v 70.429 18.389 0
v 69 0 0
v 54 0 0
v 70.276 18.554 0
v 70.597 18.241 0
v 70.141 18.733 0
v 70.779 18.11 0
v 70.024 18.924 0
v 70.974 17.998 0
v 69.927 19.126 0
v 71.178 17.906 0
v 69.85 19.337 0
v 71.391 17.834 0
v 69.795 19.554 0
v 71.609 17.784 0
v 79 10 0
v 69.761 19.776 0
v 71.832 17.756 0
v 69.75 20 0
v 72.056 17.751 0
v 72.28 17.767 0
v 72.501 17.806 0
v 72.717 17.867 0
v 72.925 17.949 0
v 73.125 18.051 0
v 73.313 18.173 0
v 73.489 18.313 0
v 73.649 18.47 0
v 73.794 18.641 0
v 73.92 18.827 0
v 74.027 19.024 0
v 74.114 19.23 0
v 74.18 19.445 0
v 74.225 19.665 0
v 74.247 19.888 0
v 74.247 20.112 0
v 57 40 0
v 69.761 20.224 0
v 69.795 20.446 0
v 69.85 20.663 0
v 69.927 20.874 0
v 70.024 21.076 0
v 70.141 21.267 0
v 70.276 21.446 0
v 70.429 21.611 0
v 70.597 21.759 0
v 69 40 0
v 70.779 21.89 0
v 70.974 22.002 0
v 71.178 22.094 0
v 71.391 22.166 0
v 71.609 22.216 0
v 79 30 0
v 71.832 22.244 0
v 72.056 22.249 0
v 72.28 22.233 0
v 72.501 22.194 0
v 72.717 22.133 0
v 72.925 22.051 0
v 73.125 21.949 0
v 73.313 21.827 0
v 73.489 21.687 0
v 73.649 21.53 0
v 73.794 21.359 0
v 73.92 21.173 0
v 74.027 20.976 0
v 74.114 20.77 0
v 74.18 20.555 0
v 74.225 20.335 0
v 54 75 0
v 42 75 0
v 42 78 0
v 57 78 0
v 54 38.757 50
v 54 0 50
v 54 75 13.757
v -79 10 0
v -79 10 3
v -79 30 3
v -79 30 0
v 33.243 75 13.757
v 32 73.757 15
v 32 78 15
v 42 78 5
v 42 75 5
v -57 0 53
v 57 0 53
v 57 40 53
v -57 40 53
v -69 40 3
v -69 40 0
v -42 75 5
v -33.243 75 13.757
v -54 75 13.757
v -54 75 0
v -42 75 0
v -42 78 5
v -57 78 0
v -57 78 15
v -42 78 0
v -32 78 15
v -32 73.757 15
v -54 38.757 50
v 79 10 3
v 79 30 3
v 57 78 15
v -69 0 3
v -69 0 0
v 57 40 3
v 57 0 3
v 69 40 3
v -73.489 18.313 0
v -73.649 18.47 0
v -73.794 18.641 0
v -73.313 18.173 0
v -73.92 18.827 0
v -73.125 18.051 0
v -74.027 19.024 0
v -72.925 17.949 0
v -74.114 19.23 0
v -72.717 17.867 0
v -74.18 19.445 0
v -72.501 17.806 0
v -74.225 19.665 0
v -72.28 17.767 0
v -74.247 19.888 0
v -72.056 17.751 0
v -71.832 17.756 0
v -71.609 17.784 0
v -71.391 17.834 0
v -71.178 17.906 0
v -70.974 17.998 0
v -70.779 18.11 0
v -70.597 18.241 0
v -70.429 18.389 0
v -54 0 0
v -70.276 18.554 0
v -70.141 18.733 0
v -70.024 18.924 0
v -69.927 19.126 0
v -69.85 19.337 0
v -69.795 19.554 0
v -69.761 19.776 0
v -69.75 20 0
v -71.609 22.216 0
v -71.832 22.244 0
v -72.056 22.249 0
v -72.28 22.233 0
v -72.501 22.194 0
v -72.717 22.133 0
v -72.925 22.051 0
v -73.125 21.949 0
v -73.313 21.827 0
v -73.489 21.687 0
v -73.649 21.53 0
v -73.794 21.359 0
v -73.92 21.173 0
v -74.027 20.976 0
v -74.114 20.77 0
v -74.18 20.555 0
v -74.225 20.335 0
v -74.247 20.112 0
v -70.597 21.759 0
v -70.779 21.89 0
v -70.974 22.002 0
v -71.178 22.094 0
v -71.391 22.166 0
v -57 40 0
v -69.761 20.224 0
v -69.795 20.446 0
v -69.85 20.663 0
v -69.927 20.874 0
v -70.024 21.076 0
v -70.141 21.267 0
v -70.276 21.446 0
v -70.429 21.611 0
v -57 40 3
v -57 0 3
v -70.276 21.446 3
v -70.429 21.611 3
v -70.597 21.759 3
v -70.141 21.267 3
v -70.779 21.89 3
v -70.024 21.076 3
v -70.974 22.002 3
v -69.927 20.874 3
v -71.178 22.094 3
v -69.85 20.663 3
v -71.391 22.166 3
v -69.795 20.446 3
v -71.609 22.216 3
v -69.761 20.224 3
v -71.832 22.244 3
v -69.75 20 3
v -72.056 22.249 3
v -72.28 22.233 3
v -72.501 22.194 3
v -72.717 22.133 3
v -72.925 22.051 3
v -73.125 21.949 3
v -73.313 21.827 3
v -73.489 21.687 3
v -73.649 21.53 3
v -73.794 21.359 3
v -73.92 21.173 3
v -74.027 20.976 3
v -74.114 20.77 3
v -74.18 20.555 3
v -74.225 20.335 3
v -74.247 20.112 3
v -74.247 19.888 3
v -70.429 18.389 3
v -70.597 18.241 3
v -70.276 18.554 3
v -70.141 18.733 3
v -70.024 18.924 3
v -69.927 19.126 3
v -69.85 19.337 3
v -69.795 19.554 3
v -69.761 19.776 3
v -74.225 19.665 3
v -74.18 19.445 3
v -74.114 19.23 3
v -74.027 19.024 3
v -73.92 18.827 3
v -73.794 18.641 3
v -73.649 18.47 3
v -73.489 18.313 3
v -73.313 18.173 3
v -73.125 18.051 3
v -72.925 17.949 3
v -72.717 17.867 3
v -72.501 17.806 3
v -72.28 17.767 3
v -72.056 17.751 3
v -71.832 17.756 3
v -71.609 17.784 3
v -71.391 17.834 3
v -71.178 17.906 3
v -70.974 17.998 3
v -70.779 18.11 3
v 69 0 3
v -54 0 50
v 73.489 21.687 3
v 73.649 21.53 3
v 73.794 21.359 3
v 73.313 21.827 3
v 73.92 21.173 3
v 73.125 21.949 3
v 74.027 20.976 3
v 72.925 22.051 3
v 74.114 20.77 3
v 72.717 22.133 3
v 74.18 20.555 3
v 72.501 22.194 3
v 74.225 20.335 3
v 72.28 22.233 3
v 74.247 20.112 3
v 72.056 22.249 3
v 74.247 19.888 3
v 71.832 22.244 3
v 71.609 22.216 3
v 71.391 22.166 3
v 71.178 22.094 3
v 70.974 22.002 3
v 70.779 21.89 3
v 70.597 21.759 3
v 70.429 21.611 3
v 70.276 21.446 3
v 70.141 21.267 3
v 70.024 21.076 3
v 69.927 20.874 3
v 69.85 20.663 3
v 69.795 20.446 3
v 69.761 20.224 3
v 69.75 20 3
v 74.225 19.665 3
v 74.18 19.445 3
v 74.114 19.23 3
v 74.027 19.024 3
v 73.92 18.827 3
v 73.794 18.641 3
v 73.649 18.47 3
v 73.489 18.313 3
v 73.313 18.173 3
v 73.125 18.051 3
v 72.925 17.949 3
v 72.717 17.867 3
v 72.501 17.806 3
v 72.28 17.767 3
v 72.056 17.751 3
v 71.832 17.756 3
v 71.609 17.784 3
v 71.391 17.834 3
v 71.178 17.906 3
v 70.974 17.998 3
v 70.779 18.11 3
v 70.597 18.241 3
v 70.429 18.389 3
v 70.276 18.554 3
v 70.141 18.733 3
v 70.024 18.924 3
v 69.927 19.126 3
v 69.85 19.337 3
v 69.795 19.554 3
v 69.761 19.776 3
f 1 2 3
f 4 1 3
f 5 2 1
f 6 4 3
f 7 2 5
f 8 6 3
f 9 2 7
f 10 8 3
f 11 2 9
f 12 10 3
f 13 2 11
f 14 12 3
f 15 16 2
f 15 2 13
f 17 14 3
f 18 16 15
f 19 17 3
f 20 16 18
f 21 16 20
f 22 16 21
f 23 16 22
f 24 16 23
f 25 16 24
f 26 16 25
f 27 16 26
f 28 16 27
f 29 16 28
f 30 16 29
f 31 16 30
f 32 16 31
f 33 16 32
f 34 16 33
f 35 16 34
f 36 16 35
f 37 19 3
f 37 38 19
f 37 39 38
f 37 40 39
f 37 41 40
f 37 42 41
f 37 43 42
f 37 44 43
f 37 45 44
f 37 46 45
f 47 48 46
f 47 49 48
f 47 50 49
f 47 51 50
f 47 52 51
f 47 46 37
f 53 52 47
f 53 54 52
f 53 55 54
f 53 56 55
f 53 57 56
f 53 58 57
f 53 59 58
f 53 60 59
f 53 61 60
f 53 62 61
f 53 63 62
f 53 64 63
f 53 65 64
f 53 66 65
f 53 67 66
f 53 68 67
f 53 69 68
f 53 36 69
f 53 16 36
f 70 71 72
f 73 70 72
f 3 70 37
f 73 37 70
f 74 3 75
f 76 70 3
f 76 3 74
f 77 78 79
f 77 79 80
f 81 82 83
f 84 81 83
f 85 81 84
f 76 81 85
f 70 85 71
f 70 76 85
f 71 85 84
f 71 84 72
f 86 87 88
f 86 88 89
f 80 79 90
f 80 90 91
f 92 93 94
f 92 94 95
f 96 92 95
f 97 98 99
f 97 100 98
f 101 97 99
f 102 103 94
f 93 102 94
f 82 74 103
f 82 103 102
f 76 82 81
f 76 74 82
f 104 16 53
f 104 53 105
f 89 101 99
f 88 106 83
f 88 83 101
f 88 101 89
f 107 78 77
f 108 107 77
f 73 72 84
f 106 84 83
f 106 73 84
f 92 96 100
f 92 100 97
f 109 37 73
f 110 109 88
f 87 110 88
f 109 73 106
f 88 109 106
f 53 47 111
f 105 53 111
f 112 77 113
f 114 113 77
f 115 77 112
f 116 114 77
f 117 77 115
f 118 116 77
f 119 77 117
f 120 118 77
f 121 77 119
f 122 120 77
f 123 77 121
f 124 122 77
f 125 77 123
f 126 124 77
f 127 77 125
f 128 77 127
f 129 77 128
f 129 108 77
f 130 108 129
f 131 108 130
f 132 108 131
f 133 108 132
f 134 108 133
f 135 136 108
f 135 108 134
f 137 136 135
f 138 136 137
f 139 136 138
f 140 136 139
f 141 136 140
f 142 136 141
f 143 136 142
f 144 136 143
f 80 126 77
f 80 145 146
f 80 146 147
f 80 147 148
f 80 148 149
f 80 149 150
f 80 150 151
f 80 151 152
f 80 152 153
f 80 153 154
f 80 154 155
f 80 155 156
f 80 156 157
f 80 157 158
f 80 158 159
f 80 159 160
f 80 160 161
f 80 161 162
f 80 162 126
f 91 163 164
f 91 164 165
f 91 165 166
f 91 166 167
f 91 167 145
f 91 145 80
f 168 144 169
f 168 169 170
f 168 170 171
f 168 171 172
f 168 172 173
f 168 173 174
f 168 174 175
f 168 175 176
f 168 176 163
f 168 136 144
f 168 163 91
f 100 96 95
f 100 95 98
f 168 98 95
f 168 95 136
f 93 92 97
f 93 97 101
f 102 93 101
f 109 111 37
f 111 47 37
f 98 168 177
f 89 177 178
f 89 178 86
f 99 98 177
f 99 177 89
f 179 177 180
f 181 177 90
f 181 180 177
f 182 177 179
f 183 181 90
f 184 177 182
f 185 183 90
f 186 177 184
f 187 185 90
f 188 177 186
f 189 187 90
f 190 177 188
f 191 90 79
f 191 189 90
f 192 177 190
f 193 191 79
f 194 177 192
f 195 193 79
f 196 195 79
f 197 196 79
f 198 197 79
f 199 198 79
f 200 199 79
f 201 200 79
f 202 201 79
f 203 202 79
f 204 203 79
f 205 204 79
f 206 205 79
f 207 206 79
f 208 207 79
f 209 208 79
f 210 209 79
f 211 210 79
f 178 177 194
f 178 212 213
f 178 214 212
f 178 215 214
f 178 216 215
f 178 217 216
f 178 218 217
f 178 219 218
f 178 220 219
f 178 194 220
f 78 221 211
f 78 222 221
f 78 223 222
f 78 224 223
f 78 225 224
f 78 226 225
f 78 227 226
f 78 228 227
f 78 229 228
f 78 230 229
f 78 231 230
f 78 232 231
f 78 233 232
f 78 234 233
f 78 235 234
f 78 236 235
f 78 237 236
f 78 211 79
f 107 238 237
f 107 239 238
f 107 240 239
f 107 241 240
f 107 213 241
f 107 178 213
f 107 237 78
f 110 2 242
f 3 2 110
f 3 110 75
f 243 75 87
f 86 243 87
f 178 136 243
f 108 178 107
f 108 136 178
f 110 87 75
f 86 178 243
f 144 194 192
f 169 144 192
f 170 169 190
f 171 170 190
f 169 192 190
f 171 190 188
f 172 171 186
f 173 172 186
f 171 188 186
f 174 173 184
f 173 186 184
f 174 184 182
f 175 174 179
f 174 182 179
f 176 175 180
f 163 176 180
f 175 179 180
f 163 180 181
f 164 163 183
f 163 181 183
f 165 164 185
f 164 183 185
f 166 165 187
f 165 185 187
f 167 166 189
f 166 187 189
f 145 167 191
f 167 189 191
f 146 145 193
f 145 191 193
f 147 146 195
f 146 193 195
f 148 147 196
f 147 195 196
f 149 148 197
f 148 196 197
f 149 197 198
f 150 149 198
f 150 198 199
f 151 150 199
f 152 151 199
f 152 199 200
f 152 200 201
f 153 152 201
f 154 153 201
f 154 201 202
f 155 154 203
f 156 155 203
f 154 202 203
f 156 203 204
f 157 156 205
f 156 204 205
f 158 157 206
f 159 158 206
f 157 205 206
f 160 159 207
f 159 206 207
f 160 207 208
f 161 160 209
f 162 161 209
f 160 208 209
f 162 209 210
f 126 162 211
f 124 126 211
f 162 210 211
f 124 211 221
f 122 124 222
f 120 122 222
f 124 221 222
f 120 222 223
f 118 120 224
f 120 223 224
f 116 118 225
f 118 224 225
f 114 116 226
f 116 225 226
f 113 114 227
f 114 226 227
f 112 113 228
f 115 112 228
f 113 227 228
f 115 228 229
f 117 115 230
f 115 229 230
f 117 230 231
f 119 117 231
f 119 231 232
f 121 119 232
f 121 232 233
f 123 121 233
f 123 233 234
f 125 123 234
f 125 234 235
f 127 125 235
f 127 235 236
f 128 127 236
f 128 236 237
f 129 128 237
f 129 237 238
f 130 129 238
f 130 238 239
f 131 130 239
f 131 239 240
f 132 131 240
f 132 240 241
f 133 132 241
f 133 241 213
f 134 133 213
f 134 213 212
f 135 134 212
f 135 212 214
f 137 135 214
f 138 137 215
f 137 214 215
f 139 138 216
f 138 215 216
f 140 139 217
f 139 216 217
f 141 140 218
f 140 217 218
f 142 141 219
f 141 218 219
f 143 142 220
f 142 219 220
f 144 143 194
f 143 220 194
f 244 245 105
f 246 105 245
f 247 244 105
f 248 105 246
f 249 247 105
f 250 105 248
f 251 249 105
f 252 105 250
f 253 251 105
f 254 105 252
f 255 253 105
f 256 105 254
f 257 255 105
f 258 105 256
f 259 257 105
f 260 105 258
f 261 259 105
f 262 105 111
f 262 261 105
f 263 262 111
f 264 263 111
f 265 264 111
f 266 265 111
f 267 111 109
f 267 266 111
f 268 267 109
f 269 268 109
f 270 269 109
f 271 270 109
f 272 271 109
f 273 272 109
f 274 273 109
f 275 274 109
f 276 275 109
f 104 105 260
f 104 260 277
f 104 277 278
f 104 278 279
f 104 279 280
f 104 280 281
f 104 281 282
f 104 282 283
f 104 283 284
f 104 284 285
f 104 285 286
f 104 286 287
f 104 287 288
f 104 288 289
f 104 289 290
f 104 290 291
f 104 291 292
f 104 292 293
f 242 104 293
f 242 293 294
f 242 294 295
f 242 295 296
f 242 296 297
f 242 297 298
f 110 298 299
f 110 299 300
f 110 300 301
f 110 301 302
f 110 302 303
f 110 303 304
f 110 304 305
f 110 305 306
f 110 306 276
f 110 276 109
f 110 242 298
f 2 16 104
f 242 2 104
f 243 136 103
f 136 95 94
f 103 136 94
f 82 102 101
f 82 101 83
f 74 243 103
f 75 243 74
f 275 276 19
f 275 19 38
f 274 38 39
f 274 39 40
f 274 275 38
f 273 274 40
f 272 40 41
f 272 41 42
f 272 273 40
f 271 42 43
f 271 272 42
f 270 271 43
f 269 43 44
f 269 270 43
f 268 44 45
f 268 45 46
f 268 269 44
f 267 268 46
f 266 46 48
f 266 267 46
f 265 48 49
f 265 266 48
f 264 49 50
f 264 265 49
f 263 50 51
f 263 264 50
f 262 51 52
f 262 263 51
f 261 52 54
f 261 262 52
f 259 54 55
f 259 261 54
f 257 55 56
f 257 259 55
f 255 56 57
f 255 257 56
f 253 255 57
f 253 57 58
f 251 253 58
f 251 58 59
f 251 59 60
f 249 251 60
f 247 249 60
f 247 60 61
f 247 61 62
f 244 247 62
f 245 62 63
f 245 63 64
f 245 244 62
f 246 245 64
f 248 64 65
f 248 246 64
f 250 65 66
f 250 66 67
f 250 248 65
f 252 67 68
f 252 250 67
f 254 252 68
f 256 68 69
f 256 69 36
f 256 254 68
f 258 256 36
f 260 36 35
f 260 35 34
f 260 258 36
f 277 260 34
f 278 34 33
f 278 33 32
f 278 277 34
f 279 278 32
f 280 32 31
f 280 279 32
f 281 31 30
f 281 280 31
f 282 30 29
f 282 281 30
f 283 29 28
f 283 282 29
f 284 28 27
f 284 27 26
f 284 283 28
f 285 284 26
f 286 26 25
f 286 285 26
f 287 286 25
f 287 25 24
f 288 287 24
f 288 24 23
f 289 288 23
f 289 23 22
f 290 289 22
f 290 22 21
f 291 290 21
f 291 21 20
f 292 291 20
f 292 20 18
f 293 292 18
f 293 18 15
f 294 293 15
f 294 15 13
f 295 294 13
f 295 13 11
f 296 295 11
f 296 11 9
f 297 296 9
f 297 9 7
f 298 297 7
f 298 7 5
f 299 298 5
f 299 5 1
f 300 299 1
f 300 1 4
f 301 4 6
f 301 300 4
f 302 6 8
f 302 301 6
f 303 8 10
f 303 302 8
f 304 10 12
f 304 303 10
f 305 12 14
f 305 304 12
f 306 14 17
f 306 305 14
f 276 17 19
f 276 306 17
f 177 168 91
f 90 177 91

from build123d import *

# Parameters (mm, degrees)
BOSS_EXTRUDE1_DEPTH     = 40
BOSS_EXTRUDE2_DEPTH     = 3
EXTRUDE_THIN1_DEPTH     = 108
CUT_EXTRUDE1_DEPTH      = 124.020323524
CUT_EXTRUDE1_DEPTH_BACK = 12
CHAMFER1_SIZE           = 10
SKETCH5_R               = 2.25
CUT_EXTRUDE2_DEPTH      = 3


with BuildPart() as part:
    # Sketch1 → Boss-Extrude1 (new body)
    with BuildSketch(Plane(origin=(0, 0, 0), x_dir=(1, 0, 0), z_dir=(0, 1, 0))):
        Polygon((-54, 0), (-54, -50), (54, -50), (54, 0), (57, 0), (79, 0), (79, -3), (57, -3), (57, -53), (-57, -53), (-57, -3), (-79, -3), (-79, 0), (-57, 0), align=None)
    extrude(amount=BOSS_EXTRUDE1_DEPTH)

    # Sketch2 → Boss-Extrude2 (add)
    with BuildSketch(Plane.ZY.offset(57)):
        Polygon((53, 40), (15, 78), (0, 78), (0, 40), align=None)
    boss_extrude2 = extrude(amount=-BOSS_EXTRUDE2_DEPTH)

    # Mirror1: Boss-Extrude2 across plane
    add(boss_extrude2.mirror(Plane(origin=(0, 0, 0), x_dir=(0, 0, 1), z_dir=(1, 0, 0))))

    # Sketch3 → Extrude-Thin1 (add)
    with BuildSketch(Plane.ZY.offset(-54)):
        Polygon((0, 78), (15, 78), (53, 40), (50.878679656, 37.878679656), (13.757359313, 75), (0, 75), align=None)
    extrude(amount=EXTRUDE_THIN1_DEPTH)

    # Sketch4 → Cut-Extrude1 (cut, two sides: drawn at the far end of the back side and taken through both)
    with BuildSketch(Plane(origin=(0, 78, 0), x_dir=(1, 0, 0), z_dir=(0, 1, 0)).offset(-CUT_EXTRUDE1_DEPTH_BACK)):
        Polygon((-42, 274.196896272), (-42, 0), (-42, -5), (-32, -15), (32, -15), (42, -5), (42, 0), (42, 274.196896272), (42, 822.590688817), (-42, 822.590688817), align=None)
    extrude(amount=CUT_EXTRUDE1_DEPTH + CUT_EXTRUDE1_DEPTH_BACK, mode=Mode.SUBTRACT)

    # Chamfer1
    chamfer1_edges = [part.edges().sort_by_distance(p)[0] for p in [
        (-79, 40, 1.5),
        (79, 0, 1.5),
        (-79, 0, 1.5),
        (79, 40, 1.5),
    ]]
    chamfer(chamfer1_edges, length=CHAMFER1_SIZE)

    # Sketch5 → Cut-Extrude2 (cut)
    with BuildSketch(Plane.XY.offset(3)):
        with Locations((-72, 20)):
            Circle(SKETCH5_R)
    cut_extrude2 = extrude(amount=-CUT_EXTRUDE2_DEPTH, mode=Mode.SUBTRACT)

    # Mirror2: Cut-Extrude2 across plane
    add(cut_extrude2.mirror(Plane(origin=(0, 0, 0), x_dir=(0, 0, 1), z_dir=(1, 0, 0))), mode=Mode.SUBTRACT)


solid = part.part
